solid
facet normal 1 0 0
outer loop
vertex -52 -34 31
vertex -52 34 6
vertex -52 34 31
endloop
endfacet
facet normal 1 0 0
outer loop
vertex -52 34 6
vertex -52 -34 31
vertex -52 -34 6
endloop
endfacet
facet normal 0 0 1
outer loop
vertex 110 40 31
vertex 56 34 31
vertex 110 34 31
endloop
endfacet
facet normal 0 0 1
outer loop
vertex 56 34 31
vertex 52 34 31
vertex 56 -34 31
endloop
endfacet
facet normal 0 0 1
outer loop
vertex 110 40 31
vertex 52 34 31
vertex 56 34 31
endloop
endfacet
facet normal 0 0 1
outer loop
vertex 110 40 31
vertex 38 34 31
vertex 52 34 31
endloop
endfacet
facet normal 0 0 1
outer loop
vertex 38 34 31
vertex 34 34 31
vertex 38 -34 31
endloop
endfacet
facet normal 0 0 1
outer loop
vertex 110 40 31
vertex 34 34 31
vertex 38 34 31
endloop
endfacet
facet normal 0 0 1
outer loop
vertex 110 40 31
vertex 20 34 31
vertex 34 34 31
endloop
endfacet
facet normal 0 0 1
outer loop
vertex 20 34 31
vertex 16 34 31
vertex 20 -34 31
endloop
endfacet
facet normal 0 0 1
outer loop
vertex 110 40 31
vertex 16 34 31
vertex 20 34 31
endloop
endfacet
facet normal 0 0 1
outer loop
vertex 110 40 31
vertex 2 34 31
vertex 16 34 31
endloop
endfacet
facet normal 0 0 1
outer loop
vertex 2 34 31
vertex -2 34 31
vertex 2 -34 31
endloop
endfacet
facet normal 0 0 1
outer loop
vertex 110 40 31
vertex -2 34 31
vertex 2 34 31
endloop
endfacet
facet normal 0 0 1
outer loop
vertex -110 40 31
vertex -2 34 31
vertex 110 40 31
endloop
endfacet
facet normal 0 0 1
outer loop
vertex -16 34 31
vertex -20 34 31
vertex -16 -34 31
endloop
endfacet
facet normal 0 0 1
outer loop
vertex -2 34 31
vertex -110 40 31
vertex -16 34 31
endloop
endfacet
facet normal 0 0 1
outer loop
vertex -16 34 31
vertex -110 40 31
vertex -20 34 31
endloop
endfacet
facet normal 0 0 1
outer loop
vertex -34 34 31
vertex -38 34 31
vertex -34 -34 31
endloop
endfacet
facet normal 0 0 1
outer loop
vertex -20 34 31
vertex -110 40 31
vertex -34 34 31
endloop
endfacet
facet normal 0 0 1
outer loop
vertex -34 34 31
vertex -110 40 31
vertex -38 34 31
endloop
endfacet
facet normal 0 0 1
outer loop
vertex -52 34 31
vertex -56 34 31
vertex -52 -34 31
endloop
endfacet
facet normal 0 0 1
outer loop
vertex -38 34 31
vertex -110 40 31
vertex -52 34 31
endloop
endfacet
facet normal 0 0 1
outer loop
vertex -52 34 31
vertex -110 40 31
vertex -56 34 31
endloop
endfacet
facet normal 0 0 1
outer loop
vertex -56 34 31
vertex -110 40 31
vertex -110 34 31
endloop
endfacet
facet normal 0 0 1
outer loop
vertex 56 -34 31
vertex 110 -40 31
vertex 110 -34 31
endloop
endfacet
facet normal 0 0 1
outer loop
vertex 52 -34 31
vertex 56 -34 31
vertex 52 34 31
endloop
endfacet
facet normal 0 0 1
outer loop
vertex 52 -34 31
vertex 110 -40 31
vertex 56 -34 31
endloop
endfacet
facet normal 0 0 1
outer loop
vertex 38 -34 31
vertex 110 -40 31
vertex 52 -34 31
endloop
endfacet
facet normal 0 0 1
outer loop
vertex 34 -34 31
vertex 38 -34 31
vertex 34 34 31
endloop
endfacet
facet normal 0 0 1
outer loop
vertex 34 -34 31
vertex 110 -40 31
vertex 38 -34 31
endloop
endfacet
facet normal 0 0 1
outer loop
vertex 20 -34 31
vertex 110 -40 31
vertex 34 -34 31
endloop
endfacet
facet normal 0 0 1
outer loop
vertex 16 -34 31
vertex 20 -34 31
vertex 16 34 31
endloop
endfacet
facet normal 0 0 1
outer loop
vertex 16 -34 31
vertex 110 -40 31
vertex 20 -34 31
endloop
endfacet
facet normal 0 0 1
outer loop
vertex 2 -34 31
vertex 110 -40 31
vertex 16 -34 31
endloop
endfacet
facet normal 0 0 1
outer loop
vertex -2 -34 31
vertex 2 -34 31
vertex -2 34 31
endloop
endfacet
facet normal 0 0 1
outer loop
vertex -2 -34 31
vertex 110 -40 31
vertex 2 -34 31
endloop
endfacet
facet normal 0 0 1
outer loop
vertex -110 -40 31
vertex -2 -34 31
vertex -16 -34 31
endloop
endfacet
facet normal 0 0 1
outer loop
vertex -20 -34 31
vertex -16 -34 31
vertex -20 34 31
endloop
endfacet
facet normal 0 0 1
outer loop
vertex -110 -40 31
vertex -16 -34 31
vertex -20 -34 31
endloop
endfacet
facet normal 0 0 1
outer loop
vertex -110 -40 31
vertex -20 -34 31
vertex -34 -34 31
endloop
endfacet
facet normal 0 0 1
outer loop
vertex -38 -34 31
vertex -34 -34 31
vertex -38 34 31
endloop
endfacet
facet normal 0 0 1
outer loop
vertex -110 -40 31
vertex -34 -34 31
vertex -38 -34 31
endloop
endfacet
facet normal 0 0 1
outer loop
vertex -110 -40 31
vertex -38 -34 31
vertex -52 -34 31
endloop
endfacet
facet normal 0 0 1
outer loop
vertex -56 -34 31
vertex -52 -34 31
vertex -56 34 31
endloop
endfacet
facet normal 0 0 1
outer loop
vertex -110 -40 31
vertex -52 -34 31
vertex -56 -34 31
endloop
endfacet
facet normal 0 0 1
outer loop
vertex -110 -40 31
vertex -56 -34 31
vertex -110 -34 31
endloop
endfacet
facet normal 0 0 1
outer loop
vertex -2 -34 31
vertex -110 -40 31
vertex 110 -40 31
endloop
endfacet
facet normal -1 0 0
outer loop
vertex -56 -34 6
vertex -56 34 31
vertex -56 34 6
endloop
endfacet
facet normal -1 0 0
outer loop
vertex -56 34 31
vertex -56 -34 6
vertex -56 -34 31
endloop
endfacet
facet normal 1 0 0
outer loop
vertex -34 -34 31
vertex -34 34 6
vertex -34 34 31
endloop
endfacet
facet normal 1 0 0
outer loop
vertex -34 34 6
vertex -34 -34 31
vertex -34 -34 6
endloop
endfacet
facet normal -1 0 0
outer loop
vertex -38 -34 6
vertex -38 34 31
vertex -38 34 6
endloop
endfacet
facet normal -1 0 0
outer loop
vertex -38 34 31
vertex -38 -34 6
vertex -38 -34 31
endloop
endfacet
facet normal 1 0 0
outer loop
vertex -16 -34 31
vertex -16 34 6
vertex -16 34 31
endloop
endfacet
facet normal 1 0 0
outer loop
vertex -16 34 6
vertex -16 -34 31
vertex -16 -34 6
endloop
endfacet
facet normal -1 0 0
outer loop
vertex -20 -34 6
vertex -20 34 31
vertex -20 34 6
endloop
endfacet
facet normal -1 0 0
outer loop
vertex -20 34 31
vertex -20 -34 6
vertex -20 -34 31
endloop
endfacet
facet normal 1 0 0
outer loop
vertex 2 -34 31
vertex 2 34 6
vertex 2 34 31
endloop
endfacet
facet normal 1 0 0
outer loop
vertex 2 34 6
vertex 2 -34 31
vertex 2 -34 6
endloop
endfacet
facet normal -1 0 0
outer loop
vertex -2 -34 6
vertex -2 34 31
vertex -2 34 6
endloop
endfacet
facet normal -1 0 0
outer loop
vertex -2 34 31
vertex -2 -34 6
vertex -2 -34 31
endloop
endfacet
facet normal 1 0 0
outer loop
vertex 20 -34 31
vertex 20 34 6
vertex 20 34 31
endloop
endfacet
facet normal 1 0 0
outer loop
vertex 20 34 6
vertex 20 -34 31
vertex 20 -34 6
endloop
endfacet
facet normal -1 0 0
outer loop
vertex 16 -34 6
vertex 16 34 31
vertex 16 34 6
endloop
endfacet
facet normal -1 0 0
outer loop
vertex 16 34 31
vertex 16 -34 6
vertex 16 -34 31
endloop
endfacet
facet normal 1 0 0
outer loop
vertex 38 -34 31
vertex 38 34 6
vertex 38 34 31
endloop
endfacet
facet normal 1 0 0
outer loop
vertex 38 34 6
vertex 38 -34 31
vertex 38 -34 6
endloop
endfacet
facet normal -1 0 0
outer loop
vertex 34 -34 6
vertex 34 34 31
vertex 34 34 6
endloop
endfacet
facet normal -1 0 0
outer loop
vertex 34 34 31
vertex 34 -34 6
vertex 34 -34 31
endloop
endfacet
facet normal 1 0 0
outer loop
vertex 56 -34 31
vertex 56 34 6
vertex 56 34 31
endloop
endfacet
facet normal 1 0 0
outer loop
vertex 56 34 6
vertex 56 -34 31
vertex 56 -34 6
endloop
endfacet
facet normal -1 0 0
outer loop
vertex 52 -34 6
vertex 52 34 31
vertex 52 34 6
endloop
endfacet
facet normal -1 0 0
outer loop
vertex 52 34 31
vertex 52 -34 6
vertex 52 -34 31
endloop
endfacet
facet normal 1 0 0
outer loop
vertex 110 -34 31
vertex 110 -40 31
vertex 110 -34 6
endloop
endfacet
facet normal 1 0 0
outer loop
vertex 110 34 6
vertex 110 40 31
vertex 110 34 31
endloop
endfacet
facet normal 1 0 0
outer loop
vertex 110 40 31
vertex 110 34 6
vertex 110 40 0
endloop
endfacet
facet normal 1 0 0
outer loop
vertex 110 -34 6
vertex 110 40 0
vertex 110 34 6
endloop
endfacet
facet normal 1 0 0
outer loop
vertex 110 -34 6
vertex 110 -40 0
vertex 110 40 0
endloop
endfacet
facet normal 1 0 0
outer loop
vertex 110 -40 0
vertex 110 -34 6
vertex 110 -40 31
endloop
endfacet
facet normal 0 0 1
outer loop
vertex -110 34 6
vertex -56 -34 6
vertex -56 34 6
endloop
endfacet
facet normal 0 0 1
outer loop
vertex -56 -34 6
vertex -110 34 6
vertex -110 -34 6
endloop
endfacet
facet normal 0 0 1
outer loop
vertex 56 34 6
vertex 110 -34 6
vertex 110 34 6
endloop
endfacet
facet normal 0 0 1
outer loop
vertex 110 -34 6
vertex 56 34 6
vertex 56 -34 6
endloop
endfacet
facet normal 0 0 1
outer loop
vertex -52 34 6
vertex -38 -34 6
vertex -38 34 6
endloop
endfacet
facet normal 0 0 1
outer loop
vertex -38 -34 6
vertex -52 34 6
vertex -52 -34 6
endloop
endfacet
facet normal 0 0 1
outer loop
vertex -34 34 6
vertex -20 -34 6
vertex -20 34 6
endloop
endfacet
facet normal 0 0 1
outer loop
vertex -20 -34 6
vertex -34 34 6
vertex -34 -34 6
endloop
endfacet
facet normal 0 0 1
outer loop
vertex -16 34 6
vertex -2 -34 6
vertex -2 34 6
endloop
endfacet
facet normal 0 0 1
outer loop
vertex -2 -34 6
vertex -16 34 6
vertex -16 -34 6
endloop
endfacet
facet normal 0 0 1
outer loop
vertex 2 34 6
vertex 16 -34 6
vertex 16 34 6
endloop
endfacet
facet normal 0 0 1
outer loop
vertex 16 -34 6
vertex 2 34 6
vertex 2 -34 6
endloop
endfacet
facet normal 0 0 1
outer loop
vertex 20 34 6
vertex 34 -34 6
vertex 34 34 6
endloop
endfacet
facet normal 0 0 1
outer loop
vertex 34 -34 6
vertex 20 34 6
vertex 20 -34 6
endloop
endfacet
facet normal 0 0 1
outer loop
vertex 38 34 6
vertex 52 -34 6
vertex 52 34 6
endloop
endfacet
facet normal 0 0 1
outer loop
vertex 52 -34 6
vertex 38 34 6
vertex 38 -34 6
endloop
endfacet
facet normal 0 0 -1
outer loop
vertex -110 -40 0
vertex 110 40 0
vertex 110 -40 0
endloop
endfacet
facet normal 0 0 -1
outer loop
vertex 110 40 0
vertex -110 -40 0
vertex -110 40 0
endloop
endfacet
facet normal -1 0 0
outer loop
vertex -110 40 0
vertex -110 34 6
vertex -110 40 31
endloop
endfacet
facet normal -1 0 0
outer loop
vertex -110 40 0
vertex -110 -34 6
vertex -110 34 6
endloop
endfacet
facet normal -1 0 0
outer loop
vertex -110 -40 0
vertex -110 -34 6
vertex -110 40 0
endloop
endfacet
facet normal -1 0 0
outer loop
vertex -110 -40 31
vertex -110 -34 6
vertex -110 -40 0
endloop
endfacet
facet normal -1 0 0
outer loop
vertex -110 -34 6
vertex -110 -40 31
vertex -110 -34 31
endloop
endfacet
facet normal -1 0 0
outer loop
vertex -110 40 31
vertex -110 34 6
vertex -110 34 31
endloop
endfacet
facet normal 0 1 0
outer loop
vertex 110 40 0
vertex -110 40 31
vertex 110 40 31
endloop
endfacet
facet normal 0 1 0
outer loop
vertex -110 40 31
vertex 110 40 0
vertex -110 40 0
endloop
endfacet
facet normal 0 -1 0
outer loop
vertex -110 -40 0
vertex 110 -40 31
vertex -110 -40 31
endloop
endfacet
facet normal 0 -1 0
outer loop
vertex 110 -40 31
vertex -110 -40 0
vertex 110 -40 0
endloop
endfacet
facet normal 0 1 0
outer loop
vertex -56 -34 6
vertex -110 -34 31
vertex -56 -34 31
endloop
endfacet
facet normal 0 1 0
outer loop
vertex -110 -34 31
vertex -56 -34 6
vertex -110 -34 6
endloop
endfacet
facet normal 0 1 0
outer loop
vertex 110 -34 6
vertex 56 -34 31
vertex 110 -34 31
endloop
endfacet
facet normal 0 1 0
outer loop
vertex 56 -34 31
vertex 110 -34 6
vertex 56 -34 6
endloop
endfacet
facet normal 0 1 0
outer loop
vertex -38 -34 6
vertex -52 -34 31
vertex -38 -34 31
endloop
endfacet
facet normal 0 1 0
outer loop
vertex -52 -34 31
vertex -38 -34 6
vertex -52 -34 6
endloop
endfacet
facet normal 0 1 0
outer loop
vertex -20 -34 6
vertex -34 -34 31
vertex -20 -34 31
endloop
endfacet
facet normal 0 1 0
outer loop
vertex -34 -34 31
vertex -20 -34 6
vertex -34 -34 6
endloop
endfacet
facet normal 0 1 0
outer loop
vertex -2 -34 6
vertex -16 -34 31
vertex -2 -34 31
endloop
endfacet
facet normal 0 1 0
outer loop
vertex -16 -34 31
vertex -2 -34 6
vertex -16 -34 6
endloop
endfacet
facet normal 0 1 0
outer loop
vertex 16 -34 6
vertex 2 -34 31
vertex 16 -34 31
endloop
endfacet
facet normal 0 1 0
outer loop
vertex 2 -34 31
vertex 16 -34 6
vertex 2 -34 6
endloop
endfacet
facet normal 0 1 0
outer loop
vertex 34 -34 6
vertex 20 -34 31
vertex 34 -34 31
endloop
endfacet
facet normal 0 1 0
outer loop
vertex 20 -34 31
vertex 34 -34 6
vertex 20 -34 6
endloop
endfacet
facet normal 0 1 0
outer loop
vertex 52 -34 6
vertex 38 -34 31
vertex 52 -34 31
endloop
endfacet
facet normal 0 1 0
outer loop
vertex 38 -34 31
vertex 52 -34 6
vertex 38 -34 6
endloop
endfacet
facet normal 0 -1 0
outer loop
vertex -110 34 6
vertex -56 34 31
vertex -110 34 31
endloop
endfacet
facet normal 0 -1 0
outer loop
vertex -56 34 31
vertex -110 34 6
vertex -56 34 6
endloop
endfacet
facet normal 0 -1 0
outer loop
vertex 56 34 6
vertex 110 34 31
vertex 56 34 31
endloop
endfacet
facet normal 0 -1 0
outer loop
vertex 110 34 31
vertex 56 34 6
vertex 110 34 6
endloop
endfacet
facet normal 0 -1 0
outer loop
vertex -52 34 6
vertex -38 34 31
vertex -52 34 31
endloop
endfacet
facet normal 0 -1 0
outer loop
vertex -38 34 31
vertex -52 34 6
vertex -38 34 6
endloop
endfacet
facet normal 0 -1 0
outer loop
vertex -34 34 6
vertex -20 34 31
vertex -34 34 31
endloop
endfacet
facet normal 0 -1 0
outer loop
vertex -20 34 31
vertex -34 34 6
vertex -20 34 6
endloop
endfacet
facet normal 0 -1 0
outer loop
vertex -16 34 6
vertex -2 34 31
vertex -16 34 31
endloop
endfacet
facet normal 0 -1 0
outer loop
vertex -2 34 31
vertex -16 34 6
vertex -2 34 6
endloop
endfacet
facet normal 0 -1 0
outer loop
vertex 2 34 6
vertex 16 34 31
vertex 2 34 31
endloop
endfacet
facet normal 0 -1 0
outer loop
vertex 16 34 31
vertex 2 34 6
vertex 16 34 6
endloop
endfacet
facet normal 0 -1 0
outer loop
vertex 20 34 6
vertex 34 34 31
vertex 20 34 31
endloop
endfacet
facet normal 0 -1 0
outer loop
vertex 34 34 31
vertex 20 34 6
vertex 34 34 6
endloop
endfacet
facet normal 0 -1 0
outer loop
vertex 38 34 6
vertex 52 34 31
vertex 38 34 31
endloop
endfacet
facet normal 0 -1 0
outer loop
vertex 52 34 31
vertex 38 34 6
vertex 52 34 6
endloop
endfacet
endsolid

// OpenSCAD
$fn = 32;

// ----------------------------------------------------------------------
// Rib frame 220 x 80 x 31
// 7 ribs at 18 mm pitch
// ----------------------------------------------------------------------

// --- parameters (mm) ---
frame = [220, 80, 6];  // base plate size (x, y, z)
rail_w = 6;            // side rail width
ribs = 7;              // number of ribs
rib_t = 4;             // rib thickness
rib_h = 25;            // rib height above the base plate
pitch = 18;            // pitch between rib centres

// --- derived feature positions (mm) ---
span = (ribs - 1) * pitch;          // = 108   distance between the outer ribs
origin_x = -span / 2;               // = -54   X of the first rib
rib_len = frame[1] - 2 * rail_w + 2;  // = 70   rib length, 1 mm into each rail
feature_centers = [
  [origin_x + 0 * pitch, 0],
  [origin_x + 1 * pitch, 0],
  [origin_x + 2 * pitch, 0],
  [origin_x + 3 * pitch, 0],
  [origin_x + 4 * pitch, 0],
  [origin_x + 5 * pitch, 0],
  [origin_x + 6 * pitch, 0]
];   // rib centre line, drives the rib loop

// base plate, two side rails, then the ribs read straight off feature_centers
union() {
  translate([-frame[0] / 2, -frame[1] / 2, 0]) cube(frame);
  translate([-frame[0] / 2, -frame[1] / 2, 0]) cube([frame[0], rail_w, frame[2] + rib_h]);
  translate([-frame[0] / 2, frame[1] / 2 - rail_w, 0]) cube([frame[0], rail_w, frame[2] + rib_h]);
  for (centre = feature_centers)
    translate([centre[0] - rib_t / 2, centre[1] - rib_len / 2, frame[2] - 1])
      cube([rib_t, rib_len, rib_h + 1]);
}
